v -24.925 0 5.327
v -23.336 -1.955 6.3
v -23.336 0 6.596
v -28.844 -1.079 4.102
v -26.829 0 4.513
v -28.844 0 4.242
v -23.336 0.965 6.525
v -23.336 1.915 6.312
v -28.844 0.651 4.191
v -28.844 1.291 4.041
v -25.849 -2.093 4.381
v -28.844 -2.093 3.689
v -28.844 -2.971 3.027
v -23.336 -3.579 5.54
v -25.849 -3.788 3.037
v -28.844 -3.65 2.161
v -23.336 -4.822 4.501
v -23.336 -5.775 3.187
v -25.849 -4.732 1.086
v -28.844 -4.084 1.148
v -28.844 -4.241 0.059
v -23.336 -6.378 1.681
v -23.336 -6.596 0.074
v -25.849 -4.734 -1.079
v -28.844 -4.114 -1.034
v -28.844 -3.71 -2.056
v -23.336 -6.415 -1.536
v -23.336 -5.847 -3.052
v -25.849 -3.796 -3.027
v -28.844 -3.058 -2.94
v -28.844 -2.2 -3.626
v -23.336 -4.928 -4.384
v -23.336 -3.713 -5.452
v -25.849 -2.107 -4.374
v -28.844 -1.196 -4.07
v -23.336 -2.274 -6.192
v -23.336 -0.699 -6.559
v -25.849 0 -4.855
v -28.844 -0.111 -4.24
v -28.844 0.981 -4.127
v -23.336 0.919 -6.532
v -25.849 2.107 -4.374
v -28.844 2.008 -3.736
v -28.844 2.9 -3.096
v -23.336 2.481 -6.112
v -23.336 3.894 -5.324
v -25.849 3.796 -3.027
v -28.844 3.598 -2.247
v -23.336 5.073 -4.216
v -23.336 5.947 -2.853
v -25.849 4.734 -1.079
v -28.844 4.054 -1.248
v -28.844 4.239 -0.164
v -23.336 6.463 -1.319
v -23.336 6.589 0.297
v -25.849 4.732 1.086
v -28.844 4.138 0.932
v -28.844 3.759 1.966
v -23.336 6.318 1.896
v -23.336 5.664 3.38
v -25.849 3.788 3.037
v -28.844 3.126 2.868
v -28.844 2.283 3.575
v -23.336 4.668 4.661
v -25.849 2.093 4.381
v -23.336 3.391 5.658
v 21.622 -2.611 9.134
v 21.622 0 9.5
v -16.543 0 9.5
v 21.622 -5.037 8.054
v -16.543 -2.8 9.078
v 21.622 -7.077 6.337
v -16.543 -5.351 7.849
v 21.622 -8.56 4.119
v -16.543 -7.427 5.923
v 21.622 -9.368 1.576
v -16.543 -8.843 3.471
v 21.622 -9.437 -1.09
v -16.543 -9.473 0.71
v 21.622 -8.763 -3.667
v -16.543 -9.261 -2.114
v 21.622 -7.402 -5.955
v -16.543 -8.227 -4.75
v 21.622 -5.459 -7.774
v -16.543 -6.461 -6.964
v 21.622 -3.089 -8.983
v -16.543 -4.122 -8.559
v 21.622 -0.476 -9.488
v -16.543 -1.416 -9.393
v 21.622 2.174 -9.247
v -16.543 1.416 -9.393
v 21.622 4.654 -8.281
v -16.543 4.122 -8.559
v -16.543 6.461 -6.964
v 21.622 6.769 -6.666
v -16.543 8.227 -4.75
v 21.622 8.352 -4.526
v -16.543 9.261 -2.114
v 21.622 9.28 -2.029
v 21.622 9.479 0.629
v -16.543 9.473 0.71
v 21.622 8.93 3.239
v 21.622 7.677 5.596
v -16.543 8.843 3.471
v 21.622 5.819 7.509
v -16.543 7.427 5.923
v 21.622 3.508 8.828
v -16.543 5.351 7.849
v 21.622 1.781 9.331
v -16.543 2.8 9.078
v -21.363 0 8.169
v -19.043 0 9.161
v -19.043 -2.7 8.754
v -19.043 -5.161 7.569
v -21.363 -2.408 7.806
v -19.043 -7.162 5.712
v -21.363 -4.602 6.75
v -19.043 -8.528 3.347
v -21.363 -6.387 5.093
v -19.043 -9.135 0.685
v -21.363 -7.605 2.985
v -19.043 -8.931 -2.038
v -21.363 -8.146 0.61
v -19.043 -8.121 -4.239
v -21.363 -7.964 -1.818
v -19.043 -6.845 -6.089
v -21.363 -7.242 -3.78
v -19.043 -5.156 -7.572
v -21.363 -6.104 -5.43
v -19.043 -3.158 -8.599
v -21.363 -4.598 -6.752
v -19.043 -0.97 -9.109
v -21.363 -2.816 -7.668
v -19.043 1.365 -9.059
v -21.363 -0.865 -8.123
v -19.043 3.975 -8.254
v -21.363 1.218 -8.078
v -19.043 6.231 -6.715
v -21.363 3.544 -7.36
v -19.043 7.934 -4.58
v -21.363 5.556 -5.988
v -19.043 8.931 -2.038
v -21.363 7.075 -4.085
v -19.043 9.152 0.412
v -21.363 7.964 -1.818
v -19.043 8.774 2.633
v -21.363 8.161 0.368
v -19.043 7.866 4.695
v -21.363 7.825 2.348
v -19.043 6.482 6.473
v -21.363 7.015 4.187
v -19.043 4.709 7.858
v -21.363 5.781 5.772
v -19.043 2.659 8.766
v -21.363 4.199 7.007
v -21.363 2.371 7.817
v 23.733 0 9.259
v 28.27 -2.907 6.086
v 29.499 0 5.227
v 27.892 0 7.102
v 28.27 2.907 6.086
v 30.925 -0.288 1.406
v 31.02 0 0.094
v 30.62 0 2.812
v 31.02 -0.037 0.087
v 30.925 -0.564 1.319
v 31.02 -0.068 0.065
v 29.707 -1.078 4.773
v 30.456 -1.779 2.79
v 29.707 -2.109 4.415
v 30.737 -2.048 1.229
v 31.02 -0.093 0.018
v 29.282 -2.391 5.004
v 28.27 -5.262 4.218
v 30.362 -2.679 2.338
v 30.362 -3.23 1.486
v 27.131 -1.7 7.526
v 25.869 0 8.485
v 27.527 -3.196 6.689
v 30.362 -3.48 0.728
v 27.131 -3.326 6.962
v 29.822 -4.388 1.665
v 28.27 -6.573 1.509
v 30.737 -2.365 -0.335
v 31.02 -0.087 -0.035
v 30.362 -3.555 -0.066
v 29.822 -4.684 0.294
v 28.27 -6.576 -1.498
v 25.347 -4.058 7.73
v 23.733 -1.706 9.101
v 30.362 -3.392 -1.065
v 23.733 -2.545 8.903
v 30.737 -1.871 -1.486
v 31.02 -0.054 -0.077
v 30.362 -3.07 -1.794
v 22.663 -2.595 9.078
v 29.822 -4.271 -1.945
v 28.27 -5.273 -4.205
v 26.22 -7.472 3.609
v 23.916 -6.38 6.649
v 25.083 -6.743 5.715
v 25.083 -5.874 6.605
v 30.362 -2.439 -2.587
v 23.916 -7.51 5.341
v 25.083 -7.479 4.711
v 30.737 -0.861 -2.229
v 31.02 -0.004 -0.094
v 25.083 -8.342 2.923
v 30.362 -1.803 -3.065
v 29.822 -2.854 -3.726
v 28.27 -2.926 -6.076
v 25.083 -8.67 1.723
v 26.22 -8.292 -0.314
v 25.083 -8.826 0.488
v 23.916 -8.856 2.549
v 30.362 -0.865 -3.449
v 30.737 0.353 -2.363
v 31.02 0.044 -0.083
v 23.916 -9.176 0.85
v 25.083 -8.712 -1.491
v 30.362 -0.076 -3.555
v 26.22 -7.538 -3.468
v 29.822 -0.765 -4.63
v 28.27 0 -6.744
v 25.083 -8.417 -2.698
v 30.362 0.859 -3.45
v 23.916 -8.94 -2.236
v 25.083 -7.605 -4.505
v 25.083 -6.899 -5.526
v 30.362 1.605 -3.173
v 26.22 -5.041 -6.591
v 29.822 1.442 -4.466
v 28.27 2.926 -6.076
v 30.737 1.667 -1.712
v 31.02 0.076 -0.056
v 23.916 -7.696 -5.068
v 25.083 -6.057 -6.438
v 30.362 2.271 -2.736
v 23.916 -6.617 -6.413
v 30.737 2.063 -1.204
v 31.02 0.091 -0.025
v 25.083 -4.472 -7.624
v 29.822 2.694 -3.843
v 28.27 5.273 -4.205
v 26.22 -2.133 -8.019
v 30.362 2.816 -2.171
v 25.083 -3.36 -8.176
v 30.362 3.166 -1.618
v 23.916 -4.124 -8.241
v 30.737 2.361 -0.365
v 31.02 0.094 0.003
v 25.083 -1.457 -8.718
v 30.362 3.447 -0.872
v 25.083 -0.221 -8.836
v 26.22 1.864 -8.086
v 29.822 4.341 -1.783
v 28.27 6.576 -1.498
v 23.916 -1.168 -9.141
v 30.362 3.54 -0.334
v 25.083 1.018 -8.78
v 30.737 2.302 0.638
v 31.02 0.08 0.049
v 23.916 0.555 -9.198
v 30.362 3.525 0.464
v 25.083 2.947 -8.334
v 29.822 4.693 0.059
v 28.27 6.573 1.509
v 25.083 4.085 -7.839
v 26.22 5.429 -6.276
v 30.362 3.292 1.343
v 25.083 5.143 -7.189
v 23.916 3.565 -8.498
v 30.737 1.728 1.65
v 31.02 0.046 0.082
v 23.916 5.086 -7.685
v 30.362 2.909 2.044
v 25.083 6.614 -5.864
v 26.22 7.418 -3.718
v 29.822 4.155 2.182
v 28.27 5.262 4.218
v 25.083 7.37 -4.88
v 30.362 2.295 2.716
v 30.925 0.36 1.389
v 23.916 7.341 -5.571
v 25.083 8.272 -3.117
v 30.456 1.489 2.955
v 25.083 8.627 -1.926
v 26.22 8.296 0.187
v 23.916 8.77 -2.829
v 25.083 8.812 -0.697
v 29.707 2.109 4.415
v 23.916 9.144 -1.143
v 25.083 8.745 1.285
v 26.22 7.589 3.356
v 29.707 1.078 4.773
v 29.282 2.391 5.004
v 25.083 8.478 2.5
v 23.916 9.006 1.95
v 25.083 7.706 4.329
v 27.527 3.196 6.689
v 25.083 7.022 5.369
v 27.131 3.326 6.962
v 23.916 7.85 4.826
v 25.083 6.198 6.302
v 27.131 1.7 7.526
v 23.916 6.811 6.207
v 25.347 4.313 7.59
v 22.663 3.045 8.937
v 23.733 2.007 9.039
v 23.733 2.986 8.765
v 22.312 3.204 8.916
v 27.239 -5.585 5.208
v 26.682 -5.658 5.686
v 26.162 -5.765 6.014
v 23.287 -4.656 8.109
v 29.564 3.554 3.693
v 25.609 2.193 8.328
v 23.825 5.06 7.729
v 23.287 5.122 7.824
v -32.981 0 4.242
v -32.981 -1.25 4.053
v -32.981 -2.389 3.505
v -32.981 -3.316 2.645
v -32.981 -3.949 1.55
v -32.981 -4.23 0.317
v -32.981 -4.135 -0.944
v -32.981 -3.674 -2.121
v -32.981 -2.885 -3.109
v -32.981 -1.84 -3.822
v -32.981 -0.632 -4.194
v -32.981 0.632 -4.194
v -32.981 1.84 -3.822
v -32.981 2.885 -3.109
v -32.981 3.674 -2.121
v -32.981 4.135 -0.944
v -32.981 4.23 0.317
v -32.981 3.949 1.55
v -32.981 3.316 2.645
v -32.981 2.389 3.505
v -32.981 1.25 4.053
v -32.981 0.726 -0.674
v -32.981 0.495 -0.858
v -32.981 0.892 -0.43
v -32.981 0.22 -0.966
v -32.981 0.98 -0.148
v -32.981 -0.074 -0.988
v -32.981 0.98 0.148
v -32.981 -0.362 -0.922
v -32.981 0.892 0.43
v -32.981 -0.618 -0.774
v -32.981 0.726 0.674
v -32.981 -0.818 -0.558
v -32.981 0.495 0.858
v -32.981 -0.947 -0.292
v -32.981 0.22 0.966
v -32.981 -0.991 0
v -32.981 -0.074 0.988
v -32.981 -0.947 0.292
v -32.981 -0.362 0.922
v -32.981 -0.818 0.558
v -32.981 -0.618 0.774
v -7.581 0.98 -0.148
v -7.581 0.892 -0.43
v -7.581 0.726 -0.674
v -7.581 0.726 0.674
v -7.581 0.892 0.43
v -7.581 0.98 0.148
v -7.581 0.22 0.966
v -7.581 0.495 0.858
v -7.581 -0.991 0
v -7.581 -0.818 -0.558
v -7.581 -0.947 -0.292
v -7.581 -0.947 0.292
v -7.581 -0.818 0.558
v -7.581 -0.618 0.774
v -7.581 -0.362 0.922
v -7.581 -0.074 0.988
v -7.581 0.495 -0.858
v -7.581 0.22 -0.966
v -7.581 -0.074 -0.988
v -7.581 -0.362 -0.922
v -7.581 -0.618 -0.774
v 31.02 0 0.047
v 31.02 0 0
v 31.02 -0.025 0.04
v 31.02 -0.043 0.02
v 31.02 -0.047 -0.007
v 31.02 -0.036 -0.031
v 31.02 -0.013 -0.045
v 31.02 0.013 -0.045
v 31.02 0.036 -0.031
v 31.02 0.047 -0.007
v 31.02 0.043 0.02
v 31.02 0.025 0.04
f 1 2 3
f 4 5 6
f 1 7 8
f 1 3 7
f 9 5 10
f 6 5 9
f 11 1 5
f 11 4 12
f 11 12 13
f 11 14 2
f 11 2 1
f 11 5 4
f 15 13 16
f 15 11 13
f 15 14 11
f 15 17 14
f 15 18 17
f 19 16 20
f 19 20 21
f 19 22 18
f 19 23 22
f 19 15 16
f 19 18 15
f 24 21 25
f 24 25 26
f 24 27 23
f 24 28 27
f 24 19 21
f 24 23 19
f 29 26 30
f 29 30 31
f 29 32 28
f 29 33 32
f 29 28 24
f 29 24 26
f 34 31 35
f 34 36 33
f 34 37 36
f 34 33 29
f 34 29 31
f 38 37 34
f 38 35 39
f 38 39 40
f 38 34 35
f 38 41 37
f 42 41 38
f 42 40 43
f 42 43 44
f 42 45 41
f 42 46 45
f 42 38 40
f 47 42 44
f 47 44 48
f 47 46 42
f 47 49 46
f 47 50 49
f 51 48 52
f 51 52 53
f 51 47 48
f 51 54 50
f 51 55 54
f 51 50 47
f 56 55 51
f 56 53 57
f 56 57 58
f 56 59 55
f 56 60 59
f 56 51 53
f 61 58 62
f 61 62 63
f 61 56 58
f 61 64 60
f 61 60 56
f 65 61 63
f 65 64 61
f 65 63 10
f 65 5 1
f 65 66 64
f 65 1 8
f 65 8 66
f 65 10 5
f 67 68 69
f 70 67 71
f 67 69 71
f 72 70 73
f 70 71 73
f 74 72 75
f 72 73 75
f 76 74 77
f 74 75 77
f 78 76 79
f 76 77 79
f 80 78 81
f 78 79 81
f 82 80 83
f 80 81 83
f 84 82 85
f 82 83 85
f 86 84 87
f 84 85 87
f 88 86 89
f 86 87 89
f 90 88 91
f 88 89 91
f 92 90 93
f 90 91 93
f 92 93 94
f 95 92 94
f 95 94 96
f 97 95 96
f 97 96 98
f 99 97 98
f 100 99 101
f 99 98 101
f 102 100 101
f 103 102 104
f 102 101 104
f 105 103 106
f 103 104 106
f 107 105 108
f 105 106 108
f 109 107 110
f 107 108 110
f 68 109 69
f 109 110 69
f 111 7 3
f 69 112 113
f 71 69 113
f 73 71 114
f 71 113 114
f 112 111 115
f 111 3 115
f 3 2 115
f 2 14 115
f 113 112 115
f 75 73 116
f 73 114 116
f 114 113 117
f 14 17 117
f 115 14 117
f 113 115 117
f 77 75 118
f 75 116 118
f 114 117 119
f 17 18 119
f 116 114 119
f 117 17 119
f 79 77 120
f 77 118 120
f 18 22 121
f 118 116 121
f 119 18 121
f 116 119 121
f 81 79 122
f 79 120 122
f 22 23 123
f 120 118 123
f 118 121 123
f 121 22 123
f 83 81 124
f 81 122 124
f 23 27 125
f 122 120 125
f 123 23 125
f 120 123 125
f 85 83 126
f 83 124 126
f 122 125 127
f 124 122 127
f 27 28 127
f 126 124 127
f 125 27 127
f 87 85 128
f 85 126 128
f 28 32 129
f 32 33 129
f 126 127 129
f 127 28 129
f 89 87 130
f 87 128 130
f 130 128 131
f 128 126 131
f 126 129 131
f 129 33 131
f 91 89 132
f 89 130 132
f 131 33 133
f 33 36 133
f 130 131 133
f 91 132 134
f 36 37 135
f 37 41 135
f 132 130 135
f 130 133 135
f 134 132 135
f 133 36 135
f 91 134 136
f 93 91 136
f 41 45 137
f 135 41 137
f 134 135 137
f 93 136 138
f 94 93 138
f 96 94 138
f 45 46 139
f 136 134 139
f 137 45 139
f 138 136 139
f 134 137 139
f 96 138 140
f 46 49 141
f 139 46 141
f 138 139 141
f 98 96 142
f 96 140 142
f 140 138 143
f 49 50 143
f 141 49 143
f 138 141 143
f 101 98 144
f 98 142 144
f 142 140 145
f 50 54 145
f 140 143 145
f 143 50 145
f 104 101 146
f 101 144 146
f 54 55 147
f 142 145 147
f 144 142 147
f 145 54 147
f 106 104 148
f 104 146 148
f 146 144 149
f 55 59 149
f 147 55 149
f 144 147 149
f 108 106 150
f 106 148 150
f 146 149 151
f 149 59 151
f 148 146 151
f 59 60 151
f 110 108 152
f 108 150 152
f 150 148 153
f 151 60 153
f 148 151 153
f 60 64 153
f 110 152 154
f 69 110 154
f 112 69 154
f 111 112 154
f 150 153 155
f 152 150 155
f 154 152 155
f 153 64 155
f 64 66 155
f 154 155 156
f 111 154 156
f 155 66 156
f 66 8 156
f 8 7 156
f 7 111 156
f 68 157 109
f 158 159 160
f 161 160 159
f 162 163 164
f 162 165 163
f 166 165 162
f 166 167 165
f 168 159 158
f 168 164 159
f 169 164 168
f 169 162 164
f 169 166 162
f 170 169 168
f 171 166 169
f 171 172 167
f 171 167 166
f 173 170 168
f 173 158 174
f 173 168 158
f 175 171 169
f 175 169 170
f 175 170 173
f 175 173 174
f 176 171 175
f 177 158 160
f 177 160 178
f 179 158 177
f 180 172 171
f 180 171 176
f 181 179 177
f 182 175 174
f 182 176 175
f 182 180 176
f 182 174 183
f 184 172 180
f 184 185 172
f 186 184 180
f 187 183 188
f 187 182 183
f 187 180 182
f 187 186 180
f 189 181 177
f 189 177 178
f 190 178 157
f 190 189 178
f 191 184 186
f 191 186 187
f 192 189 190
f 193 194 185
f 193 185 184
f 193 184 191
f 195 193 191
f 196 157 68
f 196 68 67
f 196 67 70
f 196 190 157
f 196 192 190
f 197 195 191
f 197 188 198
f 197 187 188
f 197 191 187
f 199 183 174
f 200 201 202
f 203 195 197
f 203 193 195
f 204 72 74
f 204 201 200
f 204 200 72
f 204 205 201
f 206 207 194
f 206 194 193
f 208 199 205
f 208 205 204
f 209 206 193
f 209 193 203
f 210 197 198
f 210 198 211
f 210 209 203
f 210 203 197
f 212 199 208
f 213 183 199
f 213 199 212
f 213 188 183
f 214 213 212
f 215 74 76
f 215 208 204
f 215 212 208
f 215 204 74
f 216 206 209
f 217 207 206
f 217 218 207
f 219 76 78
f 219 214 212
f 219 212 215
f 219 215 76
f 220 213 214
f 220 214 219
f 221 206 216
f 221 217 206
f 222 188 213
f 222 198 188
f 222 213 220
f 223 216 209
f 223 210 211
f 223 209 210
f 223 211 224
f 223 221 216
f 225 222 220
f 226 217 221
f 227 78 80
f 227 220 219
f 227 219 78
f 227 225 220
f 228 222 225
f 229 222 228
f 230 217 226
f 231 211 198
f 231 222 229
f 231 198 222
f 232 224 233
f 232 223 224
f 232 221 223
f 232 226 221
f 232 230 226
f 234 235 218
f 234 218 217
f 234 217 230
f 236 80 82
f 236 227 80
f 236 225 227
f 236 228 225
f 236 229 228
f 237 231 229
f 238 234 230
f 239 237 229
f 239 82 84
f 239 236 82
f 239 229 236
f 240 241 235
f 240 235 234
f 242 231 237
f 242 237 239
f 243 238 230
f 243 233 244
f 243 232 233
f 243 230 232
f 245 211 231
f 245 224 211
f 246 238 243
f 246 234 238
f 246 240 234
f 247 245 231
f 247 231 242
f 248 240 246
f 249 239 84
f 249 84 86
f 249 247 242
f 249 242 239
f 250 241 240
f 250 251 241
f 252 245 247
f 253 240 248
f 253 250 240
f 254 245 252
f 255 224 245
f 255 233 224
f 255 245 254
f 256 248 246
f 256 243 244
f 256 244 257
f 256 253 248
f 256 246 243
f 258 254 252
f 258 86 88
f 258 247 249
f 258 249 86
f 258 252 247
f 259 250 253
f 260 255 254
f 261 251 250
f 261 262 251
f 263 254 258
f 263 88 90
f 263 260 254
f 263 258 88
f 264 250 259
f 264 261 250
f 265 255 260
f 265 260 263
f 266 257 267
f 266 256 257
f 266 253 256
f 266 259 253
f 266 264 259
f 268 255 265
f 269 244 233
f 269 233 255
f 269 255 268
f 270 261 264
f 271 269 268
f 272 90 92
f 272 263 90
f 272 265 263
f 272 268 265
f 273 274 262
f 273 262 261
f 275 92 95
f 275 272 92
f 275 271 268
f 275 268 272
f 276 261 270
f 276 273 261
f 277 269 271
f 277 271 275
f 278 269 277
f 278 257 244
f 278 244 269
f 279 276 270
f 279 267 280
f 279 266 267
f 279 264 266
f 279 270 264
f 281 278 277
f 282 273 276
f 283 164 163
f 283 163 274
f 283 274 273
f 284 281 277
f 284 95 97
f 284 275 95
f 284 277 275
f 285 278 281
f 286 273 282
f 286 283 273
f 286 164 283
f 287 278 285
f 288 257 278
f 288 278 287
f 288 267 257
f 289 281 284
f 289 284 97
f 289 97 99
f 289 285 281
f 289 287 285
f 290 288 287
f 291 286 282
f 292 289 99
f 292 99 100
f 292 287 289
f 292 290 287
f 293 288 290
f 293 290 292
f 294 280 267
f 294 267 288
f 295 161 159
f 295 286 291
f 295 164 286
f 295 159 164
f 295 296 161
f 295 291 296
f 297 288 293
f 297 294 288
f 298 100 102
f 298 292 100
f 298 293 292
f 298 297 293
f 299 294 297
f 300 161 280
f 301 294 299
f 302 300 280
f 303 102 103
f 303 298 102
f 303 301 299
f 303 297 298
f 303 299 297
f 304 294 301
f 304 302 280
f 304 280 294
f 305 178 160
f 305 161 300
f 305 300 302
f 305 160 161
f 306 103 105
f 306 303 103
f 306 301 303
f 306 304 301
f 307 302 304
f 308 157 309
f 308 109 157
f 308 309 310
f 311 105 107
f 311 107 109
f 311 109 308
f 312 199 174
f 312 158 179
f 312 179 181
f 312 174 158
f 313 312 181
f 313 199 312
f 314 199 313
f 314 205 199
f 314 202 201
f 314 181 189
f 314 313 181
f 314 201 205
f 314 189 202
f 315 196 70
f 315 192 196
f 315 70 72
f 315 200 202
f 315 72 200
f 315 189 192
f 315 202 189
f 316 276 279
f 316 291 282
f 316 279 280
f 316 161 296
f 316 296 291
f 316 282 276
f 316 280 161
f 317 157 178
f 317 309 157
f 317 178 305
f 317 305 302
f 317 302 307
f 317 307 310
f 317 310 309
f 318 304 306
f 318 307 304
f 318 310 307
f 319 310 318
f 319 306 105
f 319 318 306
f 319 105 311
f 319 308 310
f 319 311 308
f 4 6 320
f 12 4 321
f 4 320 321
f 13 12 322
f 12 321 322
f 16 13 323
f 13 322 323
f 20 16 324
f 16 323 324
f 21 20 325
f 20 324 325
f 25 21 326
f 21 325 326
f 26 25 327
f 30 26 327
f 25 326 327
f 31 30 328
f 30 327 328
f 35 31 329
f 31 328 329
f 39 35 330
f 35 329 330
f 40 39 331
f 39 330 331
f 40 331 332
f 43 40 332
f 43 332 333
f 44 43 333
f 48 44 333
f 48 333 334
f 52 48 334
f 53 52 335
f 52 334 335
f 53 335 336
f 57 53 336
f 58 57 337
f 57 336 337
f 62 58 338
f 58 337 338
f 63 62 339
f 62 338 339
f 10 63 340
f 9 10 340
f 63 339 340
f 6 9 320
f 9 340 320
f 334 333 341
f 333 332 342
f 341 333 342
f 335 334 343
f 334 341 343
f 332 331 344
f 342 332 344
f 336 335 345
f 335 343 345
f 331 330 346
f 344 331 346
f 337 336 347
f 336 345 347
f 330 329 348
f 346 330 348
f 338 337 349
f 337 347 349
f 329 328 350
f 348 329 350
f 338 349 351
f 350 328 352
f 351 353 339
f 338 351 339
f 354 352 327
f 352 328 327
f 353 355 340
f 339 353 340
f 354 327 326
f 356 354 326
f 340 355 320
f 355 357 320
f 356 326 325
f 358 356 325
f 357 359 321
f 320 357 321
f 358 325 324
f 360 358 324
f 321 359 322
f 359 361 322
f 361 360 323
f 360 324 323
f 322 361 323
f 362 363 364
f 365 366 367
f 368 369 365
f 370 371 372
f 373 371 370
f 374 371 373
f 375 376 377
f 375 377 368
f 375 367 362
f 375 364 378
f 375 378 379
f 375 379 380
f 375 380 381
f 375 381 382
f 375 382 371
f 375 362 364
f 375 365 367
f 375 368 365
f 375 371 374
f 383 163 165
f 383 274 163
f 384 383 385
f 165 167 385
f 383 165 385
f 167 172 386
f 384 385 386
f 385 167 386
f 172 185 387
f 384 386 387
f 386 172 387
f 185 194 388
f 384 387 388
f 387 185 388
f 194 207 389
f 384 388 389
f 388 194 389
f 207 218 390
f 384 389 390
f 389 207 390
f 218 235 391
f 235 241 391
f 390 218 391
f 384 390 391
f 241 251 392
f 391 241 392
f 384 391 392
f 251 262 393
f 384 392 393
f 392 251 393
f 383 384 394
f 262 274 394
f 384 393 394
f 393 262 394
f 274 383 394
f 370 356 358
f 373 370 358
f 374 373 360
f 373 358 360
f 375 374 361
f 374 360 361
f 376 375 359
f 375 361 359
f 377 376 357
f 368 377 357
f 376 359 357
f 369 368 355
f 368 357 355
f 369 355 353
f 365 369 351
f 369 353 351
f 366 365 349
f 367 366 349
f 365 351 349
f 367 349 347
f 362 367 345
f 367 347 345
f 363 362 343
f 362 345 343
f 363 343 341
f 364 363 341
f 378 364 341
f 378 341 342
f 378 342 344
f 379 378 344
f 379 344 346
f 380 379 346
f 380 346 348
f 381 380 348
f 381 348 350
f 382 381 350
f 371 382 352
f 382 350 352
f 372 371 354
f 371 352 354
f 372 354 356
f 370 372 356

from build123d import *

# Parameters (mm, degrees)
F2_R     = 9.398
F4_R     = 7.62
F5_R     = 0.9906
F6_DEPTH = 25.4


# Not quite as in the source:
# - a fillet or chamfer that OpenCascade refuses, or shapes differently, is made with other operations: its cross-section is extruded or revolved along the edge and cut away or added


with BuildPart() as f1:
    # F0 (on Front) → F1 (revolve)
    with BuildSketch(Plane.XZ):
        Polygon((-32.9808058875, 0), (0, 0), (31.0198143902, 0), (31.0271941125, 9.4996), (-24.9798058875, 9.4996), (-24.9798058875, 4.2418), (-32.9808058875, 4.2418), align=None)
    revolve(axis=Axis((15.5099071951, 0, 0), (1, 0, 0)))

    # F2
    f2_edges = [f1.edges().sort_by_distance(p)[0] for p in [
        (31.027194, 0, -9.4996),
        (31.023504, 0, 4.7498),
    ]]
    fillet(f2_edges, radius=F2_R)

    # F3: fillet of radius 9.398 on 1 edges, made by hand

    # F3_s1 → F3_t2 (revolve, cut)
    with BuildSketch(Plane.XZ):
        with BuildLine():
            ThreePointArc((-16.542913808, 9.4996), (-21.5134673185, 8.0775640044), (-24.9798058875, 4.2418))
            Line((-24.9798058875, 4.2418), (-24.9798058875, 9.4996))
            Line((-24.9798058875, 9.4996), (-16.542913808, 9.4996))
        make_face()
    revolve(axis=Axis((-24.9798058875, 0, 0), (1, 0, 0)), mode=Mode.SUBTRACT)

    # F4
    f4_edges = [f1.edges().sort_by_distance(p)[0] for p in [
        (-24.979806, 0, -4.2418),
    ]]
    fillet(f4_edges, radius=F4_R)

    # F5 (on face) → F6 (cut)
    with BuildSketch(Plane(origin=(-32.9808058875, 0, 0), x_dir=(0, -1, 0), z_dir=(-1, 0, 0))):
        Circle(F5_R)
    extrude(amount=-F6_DEPTH, mode=Mode.SUBTRACT)


solid = f1.part
